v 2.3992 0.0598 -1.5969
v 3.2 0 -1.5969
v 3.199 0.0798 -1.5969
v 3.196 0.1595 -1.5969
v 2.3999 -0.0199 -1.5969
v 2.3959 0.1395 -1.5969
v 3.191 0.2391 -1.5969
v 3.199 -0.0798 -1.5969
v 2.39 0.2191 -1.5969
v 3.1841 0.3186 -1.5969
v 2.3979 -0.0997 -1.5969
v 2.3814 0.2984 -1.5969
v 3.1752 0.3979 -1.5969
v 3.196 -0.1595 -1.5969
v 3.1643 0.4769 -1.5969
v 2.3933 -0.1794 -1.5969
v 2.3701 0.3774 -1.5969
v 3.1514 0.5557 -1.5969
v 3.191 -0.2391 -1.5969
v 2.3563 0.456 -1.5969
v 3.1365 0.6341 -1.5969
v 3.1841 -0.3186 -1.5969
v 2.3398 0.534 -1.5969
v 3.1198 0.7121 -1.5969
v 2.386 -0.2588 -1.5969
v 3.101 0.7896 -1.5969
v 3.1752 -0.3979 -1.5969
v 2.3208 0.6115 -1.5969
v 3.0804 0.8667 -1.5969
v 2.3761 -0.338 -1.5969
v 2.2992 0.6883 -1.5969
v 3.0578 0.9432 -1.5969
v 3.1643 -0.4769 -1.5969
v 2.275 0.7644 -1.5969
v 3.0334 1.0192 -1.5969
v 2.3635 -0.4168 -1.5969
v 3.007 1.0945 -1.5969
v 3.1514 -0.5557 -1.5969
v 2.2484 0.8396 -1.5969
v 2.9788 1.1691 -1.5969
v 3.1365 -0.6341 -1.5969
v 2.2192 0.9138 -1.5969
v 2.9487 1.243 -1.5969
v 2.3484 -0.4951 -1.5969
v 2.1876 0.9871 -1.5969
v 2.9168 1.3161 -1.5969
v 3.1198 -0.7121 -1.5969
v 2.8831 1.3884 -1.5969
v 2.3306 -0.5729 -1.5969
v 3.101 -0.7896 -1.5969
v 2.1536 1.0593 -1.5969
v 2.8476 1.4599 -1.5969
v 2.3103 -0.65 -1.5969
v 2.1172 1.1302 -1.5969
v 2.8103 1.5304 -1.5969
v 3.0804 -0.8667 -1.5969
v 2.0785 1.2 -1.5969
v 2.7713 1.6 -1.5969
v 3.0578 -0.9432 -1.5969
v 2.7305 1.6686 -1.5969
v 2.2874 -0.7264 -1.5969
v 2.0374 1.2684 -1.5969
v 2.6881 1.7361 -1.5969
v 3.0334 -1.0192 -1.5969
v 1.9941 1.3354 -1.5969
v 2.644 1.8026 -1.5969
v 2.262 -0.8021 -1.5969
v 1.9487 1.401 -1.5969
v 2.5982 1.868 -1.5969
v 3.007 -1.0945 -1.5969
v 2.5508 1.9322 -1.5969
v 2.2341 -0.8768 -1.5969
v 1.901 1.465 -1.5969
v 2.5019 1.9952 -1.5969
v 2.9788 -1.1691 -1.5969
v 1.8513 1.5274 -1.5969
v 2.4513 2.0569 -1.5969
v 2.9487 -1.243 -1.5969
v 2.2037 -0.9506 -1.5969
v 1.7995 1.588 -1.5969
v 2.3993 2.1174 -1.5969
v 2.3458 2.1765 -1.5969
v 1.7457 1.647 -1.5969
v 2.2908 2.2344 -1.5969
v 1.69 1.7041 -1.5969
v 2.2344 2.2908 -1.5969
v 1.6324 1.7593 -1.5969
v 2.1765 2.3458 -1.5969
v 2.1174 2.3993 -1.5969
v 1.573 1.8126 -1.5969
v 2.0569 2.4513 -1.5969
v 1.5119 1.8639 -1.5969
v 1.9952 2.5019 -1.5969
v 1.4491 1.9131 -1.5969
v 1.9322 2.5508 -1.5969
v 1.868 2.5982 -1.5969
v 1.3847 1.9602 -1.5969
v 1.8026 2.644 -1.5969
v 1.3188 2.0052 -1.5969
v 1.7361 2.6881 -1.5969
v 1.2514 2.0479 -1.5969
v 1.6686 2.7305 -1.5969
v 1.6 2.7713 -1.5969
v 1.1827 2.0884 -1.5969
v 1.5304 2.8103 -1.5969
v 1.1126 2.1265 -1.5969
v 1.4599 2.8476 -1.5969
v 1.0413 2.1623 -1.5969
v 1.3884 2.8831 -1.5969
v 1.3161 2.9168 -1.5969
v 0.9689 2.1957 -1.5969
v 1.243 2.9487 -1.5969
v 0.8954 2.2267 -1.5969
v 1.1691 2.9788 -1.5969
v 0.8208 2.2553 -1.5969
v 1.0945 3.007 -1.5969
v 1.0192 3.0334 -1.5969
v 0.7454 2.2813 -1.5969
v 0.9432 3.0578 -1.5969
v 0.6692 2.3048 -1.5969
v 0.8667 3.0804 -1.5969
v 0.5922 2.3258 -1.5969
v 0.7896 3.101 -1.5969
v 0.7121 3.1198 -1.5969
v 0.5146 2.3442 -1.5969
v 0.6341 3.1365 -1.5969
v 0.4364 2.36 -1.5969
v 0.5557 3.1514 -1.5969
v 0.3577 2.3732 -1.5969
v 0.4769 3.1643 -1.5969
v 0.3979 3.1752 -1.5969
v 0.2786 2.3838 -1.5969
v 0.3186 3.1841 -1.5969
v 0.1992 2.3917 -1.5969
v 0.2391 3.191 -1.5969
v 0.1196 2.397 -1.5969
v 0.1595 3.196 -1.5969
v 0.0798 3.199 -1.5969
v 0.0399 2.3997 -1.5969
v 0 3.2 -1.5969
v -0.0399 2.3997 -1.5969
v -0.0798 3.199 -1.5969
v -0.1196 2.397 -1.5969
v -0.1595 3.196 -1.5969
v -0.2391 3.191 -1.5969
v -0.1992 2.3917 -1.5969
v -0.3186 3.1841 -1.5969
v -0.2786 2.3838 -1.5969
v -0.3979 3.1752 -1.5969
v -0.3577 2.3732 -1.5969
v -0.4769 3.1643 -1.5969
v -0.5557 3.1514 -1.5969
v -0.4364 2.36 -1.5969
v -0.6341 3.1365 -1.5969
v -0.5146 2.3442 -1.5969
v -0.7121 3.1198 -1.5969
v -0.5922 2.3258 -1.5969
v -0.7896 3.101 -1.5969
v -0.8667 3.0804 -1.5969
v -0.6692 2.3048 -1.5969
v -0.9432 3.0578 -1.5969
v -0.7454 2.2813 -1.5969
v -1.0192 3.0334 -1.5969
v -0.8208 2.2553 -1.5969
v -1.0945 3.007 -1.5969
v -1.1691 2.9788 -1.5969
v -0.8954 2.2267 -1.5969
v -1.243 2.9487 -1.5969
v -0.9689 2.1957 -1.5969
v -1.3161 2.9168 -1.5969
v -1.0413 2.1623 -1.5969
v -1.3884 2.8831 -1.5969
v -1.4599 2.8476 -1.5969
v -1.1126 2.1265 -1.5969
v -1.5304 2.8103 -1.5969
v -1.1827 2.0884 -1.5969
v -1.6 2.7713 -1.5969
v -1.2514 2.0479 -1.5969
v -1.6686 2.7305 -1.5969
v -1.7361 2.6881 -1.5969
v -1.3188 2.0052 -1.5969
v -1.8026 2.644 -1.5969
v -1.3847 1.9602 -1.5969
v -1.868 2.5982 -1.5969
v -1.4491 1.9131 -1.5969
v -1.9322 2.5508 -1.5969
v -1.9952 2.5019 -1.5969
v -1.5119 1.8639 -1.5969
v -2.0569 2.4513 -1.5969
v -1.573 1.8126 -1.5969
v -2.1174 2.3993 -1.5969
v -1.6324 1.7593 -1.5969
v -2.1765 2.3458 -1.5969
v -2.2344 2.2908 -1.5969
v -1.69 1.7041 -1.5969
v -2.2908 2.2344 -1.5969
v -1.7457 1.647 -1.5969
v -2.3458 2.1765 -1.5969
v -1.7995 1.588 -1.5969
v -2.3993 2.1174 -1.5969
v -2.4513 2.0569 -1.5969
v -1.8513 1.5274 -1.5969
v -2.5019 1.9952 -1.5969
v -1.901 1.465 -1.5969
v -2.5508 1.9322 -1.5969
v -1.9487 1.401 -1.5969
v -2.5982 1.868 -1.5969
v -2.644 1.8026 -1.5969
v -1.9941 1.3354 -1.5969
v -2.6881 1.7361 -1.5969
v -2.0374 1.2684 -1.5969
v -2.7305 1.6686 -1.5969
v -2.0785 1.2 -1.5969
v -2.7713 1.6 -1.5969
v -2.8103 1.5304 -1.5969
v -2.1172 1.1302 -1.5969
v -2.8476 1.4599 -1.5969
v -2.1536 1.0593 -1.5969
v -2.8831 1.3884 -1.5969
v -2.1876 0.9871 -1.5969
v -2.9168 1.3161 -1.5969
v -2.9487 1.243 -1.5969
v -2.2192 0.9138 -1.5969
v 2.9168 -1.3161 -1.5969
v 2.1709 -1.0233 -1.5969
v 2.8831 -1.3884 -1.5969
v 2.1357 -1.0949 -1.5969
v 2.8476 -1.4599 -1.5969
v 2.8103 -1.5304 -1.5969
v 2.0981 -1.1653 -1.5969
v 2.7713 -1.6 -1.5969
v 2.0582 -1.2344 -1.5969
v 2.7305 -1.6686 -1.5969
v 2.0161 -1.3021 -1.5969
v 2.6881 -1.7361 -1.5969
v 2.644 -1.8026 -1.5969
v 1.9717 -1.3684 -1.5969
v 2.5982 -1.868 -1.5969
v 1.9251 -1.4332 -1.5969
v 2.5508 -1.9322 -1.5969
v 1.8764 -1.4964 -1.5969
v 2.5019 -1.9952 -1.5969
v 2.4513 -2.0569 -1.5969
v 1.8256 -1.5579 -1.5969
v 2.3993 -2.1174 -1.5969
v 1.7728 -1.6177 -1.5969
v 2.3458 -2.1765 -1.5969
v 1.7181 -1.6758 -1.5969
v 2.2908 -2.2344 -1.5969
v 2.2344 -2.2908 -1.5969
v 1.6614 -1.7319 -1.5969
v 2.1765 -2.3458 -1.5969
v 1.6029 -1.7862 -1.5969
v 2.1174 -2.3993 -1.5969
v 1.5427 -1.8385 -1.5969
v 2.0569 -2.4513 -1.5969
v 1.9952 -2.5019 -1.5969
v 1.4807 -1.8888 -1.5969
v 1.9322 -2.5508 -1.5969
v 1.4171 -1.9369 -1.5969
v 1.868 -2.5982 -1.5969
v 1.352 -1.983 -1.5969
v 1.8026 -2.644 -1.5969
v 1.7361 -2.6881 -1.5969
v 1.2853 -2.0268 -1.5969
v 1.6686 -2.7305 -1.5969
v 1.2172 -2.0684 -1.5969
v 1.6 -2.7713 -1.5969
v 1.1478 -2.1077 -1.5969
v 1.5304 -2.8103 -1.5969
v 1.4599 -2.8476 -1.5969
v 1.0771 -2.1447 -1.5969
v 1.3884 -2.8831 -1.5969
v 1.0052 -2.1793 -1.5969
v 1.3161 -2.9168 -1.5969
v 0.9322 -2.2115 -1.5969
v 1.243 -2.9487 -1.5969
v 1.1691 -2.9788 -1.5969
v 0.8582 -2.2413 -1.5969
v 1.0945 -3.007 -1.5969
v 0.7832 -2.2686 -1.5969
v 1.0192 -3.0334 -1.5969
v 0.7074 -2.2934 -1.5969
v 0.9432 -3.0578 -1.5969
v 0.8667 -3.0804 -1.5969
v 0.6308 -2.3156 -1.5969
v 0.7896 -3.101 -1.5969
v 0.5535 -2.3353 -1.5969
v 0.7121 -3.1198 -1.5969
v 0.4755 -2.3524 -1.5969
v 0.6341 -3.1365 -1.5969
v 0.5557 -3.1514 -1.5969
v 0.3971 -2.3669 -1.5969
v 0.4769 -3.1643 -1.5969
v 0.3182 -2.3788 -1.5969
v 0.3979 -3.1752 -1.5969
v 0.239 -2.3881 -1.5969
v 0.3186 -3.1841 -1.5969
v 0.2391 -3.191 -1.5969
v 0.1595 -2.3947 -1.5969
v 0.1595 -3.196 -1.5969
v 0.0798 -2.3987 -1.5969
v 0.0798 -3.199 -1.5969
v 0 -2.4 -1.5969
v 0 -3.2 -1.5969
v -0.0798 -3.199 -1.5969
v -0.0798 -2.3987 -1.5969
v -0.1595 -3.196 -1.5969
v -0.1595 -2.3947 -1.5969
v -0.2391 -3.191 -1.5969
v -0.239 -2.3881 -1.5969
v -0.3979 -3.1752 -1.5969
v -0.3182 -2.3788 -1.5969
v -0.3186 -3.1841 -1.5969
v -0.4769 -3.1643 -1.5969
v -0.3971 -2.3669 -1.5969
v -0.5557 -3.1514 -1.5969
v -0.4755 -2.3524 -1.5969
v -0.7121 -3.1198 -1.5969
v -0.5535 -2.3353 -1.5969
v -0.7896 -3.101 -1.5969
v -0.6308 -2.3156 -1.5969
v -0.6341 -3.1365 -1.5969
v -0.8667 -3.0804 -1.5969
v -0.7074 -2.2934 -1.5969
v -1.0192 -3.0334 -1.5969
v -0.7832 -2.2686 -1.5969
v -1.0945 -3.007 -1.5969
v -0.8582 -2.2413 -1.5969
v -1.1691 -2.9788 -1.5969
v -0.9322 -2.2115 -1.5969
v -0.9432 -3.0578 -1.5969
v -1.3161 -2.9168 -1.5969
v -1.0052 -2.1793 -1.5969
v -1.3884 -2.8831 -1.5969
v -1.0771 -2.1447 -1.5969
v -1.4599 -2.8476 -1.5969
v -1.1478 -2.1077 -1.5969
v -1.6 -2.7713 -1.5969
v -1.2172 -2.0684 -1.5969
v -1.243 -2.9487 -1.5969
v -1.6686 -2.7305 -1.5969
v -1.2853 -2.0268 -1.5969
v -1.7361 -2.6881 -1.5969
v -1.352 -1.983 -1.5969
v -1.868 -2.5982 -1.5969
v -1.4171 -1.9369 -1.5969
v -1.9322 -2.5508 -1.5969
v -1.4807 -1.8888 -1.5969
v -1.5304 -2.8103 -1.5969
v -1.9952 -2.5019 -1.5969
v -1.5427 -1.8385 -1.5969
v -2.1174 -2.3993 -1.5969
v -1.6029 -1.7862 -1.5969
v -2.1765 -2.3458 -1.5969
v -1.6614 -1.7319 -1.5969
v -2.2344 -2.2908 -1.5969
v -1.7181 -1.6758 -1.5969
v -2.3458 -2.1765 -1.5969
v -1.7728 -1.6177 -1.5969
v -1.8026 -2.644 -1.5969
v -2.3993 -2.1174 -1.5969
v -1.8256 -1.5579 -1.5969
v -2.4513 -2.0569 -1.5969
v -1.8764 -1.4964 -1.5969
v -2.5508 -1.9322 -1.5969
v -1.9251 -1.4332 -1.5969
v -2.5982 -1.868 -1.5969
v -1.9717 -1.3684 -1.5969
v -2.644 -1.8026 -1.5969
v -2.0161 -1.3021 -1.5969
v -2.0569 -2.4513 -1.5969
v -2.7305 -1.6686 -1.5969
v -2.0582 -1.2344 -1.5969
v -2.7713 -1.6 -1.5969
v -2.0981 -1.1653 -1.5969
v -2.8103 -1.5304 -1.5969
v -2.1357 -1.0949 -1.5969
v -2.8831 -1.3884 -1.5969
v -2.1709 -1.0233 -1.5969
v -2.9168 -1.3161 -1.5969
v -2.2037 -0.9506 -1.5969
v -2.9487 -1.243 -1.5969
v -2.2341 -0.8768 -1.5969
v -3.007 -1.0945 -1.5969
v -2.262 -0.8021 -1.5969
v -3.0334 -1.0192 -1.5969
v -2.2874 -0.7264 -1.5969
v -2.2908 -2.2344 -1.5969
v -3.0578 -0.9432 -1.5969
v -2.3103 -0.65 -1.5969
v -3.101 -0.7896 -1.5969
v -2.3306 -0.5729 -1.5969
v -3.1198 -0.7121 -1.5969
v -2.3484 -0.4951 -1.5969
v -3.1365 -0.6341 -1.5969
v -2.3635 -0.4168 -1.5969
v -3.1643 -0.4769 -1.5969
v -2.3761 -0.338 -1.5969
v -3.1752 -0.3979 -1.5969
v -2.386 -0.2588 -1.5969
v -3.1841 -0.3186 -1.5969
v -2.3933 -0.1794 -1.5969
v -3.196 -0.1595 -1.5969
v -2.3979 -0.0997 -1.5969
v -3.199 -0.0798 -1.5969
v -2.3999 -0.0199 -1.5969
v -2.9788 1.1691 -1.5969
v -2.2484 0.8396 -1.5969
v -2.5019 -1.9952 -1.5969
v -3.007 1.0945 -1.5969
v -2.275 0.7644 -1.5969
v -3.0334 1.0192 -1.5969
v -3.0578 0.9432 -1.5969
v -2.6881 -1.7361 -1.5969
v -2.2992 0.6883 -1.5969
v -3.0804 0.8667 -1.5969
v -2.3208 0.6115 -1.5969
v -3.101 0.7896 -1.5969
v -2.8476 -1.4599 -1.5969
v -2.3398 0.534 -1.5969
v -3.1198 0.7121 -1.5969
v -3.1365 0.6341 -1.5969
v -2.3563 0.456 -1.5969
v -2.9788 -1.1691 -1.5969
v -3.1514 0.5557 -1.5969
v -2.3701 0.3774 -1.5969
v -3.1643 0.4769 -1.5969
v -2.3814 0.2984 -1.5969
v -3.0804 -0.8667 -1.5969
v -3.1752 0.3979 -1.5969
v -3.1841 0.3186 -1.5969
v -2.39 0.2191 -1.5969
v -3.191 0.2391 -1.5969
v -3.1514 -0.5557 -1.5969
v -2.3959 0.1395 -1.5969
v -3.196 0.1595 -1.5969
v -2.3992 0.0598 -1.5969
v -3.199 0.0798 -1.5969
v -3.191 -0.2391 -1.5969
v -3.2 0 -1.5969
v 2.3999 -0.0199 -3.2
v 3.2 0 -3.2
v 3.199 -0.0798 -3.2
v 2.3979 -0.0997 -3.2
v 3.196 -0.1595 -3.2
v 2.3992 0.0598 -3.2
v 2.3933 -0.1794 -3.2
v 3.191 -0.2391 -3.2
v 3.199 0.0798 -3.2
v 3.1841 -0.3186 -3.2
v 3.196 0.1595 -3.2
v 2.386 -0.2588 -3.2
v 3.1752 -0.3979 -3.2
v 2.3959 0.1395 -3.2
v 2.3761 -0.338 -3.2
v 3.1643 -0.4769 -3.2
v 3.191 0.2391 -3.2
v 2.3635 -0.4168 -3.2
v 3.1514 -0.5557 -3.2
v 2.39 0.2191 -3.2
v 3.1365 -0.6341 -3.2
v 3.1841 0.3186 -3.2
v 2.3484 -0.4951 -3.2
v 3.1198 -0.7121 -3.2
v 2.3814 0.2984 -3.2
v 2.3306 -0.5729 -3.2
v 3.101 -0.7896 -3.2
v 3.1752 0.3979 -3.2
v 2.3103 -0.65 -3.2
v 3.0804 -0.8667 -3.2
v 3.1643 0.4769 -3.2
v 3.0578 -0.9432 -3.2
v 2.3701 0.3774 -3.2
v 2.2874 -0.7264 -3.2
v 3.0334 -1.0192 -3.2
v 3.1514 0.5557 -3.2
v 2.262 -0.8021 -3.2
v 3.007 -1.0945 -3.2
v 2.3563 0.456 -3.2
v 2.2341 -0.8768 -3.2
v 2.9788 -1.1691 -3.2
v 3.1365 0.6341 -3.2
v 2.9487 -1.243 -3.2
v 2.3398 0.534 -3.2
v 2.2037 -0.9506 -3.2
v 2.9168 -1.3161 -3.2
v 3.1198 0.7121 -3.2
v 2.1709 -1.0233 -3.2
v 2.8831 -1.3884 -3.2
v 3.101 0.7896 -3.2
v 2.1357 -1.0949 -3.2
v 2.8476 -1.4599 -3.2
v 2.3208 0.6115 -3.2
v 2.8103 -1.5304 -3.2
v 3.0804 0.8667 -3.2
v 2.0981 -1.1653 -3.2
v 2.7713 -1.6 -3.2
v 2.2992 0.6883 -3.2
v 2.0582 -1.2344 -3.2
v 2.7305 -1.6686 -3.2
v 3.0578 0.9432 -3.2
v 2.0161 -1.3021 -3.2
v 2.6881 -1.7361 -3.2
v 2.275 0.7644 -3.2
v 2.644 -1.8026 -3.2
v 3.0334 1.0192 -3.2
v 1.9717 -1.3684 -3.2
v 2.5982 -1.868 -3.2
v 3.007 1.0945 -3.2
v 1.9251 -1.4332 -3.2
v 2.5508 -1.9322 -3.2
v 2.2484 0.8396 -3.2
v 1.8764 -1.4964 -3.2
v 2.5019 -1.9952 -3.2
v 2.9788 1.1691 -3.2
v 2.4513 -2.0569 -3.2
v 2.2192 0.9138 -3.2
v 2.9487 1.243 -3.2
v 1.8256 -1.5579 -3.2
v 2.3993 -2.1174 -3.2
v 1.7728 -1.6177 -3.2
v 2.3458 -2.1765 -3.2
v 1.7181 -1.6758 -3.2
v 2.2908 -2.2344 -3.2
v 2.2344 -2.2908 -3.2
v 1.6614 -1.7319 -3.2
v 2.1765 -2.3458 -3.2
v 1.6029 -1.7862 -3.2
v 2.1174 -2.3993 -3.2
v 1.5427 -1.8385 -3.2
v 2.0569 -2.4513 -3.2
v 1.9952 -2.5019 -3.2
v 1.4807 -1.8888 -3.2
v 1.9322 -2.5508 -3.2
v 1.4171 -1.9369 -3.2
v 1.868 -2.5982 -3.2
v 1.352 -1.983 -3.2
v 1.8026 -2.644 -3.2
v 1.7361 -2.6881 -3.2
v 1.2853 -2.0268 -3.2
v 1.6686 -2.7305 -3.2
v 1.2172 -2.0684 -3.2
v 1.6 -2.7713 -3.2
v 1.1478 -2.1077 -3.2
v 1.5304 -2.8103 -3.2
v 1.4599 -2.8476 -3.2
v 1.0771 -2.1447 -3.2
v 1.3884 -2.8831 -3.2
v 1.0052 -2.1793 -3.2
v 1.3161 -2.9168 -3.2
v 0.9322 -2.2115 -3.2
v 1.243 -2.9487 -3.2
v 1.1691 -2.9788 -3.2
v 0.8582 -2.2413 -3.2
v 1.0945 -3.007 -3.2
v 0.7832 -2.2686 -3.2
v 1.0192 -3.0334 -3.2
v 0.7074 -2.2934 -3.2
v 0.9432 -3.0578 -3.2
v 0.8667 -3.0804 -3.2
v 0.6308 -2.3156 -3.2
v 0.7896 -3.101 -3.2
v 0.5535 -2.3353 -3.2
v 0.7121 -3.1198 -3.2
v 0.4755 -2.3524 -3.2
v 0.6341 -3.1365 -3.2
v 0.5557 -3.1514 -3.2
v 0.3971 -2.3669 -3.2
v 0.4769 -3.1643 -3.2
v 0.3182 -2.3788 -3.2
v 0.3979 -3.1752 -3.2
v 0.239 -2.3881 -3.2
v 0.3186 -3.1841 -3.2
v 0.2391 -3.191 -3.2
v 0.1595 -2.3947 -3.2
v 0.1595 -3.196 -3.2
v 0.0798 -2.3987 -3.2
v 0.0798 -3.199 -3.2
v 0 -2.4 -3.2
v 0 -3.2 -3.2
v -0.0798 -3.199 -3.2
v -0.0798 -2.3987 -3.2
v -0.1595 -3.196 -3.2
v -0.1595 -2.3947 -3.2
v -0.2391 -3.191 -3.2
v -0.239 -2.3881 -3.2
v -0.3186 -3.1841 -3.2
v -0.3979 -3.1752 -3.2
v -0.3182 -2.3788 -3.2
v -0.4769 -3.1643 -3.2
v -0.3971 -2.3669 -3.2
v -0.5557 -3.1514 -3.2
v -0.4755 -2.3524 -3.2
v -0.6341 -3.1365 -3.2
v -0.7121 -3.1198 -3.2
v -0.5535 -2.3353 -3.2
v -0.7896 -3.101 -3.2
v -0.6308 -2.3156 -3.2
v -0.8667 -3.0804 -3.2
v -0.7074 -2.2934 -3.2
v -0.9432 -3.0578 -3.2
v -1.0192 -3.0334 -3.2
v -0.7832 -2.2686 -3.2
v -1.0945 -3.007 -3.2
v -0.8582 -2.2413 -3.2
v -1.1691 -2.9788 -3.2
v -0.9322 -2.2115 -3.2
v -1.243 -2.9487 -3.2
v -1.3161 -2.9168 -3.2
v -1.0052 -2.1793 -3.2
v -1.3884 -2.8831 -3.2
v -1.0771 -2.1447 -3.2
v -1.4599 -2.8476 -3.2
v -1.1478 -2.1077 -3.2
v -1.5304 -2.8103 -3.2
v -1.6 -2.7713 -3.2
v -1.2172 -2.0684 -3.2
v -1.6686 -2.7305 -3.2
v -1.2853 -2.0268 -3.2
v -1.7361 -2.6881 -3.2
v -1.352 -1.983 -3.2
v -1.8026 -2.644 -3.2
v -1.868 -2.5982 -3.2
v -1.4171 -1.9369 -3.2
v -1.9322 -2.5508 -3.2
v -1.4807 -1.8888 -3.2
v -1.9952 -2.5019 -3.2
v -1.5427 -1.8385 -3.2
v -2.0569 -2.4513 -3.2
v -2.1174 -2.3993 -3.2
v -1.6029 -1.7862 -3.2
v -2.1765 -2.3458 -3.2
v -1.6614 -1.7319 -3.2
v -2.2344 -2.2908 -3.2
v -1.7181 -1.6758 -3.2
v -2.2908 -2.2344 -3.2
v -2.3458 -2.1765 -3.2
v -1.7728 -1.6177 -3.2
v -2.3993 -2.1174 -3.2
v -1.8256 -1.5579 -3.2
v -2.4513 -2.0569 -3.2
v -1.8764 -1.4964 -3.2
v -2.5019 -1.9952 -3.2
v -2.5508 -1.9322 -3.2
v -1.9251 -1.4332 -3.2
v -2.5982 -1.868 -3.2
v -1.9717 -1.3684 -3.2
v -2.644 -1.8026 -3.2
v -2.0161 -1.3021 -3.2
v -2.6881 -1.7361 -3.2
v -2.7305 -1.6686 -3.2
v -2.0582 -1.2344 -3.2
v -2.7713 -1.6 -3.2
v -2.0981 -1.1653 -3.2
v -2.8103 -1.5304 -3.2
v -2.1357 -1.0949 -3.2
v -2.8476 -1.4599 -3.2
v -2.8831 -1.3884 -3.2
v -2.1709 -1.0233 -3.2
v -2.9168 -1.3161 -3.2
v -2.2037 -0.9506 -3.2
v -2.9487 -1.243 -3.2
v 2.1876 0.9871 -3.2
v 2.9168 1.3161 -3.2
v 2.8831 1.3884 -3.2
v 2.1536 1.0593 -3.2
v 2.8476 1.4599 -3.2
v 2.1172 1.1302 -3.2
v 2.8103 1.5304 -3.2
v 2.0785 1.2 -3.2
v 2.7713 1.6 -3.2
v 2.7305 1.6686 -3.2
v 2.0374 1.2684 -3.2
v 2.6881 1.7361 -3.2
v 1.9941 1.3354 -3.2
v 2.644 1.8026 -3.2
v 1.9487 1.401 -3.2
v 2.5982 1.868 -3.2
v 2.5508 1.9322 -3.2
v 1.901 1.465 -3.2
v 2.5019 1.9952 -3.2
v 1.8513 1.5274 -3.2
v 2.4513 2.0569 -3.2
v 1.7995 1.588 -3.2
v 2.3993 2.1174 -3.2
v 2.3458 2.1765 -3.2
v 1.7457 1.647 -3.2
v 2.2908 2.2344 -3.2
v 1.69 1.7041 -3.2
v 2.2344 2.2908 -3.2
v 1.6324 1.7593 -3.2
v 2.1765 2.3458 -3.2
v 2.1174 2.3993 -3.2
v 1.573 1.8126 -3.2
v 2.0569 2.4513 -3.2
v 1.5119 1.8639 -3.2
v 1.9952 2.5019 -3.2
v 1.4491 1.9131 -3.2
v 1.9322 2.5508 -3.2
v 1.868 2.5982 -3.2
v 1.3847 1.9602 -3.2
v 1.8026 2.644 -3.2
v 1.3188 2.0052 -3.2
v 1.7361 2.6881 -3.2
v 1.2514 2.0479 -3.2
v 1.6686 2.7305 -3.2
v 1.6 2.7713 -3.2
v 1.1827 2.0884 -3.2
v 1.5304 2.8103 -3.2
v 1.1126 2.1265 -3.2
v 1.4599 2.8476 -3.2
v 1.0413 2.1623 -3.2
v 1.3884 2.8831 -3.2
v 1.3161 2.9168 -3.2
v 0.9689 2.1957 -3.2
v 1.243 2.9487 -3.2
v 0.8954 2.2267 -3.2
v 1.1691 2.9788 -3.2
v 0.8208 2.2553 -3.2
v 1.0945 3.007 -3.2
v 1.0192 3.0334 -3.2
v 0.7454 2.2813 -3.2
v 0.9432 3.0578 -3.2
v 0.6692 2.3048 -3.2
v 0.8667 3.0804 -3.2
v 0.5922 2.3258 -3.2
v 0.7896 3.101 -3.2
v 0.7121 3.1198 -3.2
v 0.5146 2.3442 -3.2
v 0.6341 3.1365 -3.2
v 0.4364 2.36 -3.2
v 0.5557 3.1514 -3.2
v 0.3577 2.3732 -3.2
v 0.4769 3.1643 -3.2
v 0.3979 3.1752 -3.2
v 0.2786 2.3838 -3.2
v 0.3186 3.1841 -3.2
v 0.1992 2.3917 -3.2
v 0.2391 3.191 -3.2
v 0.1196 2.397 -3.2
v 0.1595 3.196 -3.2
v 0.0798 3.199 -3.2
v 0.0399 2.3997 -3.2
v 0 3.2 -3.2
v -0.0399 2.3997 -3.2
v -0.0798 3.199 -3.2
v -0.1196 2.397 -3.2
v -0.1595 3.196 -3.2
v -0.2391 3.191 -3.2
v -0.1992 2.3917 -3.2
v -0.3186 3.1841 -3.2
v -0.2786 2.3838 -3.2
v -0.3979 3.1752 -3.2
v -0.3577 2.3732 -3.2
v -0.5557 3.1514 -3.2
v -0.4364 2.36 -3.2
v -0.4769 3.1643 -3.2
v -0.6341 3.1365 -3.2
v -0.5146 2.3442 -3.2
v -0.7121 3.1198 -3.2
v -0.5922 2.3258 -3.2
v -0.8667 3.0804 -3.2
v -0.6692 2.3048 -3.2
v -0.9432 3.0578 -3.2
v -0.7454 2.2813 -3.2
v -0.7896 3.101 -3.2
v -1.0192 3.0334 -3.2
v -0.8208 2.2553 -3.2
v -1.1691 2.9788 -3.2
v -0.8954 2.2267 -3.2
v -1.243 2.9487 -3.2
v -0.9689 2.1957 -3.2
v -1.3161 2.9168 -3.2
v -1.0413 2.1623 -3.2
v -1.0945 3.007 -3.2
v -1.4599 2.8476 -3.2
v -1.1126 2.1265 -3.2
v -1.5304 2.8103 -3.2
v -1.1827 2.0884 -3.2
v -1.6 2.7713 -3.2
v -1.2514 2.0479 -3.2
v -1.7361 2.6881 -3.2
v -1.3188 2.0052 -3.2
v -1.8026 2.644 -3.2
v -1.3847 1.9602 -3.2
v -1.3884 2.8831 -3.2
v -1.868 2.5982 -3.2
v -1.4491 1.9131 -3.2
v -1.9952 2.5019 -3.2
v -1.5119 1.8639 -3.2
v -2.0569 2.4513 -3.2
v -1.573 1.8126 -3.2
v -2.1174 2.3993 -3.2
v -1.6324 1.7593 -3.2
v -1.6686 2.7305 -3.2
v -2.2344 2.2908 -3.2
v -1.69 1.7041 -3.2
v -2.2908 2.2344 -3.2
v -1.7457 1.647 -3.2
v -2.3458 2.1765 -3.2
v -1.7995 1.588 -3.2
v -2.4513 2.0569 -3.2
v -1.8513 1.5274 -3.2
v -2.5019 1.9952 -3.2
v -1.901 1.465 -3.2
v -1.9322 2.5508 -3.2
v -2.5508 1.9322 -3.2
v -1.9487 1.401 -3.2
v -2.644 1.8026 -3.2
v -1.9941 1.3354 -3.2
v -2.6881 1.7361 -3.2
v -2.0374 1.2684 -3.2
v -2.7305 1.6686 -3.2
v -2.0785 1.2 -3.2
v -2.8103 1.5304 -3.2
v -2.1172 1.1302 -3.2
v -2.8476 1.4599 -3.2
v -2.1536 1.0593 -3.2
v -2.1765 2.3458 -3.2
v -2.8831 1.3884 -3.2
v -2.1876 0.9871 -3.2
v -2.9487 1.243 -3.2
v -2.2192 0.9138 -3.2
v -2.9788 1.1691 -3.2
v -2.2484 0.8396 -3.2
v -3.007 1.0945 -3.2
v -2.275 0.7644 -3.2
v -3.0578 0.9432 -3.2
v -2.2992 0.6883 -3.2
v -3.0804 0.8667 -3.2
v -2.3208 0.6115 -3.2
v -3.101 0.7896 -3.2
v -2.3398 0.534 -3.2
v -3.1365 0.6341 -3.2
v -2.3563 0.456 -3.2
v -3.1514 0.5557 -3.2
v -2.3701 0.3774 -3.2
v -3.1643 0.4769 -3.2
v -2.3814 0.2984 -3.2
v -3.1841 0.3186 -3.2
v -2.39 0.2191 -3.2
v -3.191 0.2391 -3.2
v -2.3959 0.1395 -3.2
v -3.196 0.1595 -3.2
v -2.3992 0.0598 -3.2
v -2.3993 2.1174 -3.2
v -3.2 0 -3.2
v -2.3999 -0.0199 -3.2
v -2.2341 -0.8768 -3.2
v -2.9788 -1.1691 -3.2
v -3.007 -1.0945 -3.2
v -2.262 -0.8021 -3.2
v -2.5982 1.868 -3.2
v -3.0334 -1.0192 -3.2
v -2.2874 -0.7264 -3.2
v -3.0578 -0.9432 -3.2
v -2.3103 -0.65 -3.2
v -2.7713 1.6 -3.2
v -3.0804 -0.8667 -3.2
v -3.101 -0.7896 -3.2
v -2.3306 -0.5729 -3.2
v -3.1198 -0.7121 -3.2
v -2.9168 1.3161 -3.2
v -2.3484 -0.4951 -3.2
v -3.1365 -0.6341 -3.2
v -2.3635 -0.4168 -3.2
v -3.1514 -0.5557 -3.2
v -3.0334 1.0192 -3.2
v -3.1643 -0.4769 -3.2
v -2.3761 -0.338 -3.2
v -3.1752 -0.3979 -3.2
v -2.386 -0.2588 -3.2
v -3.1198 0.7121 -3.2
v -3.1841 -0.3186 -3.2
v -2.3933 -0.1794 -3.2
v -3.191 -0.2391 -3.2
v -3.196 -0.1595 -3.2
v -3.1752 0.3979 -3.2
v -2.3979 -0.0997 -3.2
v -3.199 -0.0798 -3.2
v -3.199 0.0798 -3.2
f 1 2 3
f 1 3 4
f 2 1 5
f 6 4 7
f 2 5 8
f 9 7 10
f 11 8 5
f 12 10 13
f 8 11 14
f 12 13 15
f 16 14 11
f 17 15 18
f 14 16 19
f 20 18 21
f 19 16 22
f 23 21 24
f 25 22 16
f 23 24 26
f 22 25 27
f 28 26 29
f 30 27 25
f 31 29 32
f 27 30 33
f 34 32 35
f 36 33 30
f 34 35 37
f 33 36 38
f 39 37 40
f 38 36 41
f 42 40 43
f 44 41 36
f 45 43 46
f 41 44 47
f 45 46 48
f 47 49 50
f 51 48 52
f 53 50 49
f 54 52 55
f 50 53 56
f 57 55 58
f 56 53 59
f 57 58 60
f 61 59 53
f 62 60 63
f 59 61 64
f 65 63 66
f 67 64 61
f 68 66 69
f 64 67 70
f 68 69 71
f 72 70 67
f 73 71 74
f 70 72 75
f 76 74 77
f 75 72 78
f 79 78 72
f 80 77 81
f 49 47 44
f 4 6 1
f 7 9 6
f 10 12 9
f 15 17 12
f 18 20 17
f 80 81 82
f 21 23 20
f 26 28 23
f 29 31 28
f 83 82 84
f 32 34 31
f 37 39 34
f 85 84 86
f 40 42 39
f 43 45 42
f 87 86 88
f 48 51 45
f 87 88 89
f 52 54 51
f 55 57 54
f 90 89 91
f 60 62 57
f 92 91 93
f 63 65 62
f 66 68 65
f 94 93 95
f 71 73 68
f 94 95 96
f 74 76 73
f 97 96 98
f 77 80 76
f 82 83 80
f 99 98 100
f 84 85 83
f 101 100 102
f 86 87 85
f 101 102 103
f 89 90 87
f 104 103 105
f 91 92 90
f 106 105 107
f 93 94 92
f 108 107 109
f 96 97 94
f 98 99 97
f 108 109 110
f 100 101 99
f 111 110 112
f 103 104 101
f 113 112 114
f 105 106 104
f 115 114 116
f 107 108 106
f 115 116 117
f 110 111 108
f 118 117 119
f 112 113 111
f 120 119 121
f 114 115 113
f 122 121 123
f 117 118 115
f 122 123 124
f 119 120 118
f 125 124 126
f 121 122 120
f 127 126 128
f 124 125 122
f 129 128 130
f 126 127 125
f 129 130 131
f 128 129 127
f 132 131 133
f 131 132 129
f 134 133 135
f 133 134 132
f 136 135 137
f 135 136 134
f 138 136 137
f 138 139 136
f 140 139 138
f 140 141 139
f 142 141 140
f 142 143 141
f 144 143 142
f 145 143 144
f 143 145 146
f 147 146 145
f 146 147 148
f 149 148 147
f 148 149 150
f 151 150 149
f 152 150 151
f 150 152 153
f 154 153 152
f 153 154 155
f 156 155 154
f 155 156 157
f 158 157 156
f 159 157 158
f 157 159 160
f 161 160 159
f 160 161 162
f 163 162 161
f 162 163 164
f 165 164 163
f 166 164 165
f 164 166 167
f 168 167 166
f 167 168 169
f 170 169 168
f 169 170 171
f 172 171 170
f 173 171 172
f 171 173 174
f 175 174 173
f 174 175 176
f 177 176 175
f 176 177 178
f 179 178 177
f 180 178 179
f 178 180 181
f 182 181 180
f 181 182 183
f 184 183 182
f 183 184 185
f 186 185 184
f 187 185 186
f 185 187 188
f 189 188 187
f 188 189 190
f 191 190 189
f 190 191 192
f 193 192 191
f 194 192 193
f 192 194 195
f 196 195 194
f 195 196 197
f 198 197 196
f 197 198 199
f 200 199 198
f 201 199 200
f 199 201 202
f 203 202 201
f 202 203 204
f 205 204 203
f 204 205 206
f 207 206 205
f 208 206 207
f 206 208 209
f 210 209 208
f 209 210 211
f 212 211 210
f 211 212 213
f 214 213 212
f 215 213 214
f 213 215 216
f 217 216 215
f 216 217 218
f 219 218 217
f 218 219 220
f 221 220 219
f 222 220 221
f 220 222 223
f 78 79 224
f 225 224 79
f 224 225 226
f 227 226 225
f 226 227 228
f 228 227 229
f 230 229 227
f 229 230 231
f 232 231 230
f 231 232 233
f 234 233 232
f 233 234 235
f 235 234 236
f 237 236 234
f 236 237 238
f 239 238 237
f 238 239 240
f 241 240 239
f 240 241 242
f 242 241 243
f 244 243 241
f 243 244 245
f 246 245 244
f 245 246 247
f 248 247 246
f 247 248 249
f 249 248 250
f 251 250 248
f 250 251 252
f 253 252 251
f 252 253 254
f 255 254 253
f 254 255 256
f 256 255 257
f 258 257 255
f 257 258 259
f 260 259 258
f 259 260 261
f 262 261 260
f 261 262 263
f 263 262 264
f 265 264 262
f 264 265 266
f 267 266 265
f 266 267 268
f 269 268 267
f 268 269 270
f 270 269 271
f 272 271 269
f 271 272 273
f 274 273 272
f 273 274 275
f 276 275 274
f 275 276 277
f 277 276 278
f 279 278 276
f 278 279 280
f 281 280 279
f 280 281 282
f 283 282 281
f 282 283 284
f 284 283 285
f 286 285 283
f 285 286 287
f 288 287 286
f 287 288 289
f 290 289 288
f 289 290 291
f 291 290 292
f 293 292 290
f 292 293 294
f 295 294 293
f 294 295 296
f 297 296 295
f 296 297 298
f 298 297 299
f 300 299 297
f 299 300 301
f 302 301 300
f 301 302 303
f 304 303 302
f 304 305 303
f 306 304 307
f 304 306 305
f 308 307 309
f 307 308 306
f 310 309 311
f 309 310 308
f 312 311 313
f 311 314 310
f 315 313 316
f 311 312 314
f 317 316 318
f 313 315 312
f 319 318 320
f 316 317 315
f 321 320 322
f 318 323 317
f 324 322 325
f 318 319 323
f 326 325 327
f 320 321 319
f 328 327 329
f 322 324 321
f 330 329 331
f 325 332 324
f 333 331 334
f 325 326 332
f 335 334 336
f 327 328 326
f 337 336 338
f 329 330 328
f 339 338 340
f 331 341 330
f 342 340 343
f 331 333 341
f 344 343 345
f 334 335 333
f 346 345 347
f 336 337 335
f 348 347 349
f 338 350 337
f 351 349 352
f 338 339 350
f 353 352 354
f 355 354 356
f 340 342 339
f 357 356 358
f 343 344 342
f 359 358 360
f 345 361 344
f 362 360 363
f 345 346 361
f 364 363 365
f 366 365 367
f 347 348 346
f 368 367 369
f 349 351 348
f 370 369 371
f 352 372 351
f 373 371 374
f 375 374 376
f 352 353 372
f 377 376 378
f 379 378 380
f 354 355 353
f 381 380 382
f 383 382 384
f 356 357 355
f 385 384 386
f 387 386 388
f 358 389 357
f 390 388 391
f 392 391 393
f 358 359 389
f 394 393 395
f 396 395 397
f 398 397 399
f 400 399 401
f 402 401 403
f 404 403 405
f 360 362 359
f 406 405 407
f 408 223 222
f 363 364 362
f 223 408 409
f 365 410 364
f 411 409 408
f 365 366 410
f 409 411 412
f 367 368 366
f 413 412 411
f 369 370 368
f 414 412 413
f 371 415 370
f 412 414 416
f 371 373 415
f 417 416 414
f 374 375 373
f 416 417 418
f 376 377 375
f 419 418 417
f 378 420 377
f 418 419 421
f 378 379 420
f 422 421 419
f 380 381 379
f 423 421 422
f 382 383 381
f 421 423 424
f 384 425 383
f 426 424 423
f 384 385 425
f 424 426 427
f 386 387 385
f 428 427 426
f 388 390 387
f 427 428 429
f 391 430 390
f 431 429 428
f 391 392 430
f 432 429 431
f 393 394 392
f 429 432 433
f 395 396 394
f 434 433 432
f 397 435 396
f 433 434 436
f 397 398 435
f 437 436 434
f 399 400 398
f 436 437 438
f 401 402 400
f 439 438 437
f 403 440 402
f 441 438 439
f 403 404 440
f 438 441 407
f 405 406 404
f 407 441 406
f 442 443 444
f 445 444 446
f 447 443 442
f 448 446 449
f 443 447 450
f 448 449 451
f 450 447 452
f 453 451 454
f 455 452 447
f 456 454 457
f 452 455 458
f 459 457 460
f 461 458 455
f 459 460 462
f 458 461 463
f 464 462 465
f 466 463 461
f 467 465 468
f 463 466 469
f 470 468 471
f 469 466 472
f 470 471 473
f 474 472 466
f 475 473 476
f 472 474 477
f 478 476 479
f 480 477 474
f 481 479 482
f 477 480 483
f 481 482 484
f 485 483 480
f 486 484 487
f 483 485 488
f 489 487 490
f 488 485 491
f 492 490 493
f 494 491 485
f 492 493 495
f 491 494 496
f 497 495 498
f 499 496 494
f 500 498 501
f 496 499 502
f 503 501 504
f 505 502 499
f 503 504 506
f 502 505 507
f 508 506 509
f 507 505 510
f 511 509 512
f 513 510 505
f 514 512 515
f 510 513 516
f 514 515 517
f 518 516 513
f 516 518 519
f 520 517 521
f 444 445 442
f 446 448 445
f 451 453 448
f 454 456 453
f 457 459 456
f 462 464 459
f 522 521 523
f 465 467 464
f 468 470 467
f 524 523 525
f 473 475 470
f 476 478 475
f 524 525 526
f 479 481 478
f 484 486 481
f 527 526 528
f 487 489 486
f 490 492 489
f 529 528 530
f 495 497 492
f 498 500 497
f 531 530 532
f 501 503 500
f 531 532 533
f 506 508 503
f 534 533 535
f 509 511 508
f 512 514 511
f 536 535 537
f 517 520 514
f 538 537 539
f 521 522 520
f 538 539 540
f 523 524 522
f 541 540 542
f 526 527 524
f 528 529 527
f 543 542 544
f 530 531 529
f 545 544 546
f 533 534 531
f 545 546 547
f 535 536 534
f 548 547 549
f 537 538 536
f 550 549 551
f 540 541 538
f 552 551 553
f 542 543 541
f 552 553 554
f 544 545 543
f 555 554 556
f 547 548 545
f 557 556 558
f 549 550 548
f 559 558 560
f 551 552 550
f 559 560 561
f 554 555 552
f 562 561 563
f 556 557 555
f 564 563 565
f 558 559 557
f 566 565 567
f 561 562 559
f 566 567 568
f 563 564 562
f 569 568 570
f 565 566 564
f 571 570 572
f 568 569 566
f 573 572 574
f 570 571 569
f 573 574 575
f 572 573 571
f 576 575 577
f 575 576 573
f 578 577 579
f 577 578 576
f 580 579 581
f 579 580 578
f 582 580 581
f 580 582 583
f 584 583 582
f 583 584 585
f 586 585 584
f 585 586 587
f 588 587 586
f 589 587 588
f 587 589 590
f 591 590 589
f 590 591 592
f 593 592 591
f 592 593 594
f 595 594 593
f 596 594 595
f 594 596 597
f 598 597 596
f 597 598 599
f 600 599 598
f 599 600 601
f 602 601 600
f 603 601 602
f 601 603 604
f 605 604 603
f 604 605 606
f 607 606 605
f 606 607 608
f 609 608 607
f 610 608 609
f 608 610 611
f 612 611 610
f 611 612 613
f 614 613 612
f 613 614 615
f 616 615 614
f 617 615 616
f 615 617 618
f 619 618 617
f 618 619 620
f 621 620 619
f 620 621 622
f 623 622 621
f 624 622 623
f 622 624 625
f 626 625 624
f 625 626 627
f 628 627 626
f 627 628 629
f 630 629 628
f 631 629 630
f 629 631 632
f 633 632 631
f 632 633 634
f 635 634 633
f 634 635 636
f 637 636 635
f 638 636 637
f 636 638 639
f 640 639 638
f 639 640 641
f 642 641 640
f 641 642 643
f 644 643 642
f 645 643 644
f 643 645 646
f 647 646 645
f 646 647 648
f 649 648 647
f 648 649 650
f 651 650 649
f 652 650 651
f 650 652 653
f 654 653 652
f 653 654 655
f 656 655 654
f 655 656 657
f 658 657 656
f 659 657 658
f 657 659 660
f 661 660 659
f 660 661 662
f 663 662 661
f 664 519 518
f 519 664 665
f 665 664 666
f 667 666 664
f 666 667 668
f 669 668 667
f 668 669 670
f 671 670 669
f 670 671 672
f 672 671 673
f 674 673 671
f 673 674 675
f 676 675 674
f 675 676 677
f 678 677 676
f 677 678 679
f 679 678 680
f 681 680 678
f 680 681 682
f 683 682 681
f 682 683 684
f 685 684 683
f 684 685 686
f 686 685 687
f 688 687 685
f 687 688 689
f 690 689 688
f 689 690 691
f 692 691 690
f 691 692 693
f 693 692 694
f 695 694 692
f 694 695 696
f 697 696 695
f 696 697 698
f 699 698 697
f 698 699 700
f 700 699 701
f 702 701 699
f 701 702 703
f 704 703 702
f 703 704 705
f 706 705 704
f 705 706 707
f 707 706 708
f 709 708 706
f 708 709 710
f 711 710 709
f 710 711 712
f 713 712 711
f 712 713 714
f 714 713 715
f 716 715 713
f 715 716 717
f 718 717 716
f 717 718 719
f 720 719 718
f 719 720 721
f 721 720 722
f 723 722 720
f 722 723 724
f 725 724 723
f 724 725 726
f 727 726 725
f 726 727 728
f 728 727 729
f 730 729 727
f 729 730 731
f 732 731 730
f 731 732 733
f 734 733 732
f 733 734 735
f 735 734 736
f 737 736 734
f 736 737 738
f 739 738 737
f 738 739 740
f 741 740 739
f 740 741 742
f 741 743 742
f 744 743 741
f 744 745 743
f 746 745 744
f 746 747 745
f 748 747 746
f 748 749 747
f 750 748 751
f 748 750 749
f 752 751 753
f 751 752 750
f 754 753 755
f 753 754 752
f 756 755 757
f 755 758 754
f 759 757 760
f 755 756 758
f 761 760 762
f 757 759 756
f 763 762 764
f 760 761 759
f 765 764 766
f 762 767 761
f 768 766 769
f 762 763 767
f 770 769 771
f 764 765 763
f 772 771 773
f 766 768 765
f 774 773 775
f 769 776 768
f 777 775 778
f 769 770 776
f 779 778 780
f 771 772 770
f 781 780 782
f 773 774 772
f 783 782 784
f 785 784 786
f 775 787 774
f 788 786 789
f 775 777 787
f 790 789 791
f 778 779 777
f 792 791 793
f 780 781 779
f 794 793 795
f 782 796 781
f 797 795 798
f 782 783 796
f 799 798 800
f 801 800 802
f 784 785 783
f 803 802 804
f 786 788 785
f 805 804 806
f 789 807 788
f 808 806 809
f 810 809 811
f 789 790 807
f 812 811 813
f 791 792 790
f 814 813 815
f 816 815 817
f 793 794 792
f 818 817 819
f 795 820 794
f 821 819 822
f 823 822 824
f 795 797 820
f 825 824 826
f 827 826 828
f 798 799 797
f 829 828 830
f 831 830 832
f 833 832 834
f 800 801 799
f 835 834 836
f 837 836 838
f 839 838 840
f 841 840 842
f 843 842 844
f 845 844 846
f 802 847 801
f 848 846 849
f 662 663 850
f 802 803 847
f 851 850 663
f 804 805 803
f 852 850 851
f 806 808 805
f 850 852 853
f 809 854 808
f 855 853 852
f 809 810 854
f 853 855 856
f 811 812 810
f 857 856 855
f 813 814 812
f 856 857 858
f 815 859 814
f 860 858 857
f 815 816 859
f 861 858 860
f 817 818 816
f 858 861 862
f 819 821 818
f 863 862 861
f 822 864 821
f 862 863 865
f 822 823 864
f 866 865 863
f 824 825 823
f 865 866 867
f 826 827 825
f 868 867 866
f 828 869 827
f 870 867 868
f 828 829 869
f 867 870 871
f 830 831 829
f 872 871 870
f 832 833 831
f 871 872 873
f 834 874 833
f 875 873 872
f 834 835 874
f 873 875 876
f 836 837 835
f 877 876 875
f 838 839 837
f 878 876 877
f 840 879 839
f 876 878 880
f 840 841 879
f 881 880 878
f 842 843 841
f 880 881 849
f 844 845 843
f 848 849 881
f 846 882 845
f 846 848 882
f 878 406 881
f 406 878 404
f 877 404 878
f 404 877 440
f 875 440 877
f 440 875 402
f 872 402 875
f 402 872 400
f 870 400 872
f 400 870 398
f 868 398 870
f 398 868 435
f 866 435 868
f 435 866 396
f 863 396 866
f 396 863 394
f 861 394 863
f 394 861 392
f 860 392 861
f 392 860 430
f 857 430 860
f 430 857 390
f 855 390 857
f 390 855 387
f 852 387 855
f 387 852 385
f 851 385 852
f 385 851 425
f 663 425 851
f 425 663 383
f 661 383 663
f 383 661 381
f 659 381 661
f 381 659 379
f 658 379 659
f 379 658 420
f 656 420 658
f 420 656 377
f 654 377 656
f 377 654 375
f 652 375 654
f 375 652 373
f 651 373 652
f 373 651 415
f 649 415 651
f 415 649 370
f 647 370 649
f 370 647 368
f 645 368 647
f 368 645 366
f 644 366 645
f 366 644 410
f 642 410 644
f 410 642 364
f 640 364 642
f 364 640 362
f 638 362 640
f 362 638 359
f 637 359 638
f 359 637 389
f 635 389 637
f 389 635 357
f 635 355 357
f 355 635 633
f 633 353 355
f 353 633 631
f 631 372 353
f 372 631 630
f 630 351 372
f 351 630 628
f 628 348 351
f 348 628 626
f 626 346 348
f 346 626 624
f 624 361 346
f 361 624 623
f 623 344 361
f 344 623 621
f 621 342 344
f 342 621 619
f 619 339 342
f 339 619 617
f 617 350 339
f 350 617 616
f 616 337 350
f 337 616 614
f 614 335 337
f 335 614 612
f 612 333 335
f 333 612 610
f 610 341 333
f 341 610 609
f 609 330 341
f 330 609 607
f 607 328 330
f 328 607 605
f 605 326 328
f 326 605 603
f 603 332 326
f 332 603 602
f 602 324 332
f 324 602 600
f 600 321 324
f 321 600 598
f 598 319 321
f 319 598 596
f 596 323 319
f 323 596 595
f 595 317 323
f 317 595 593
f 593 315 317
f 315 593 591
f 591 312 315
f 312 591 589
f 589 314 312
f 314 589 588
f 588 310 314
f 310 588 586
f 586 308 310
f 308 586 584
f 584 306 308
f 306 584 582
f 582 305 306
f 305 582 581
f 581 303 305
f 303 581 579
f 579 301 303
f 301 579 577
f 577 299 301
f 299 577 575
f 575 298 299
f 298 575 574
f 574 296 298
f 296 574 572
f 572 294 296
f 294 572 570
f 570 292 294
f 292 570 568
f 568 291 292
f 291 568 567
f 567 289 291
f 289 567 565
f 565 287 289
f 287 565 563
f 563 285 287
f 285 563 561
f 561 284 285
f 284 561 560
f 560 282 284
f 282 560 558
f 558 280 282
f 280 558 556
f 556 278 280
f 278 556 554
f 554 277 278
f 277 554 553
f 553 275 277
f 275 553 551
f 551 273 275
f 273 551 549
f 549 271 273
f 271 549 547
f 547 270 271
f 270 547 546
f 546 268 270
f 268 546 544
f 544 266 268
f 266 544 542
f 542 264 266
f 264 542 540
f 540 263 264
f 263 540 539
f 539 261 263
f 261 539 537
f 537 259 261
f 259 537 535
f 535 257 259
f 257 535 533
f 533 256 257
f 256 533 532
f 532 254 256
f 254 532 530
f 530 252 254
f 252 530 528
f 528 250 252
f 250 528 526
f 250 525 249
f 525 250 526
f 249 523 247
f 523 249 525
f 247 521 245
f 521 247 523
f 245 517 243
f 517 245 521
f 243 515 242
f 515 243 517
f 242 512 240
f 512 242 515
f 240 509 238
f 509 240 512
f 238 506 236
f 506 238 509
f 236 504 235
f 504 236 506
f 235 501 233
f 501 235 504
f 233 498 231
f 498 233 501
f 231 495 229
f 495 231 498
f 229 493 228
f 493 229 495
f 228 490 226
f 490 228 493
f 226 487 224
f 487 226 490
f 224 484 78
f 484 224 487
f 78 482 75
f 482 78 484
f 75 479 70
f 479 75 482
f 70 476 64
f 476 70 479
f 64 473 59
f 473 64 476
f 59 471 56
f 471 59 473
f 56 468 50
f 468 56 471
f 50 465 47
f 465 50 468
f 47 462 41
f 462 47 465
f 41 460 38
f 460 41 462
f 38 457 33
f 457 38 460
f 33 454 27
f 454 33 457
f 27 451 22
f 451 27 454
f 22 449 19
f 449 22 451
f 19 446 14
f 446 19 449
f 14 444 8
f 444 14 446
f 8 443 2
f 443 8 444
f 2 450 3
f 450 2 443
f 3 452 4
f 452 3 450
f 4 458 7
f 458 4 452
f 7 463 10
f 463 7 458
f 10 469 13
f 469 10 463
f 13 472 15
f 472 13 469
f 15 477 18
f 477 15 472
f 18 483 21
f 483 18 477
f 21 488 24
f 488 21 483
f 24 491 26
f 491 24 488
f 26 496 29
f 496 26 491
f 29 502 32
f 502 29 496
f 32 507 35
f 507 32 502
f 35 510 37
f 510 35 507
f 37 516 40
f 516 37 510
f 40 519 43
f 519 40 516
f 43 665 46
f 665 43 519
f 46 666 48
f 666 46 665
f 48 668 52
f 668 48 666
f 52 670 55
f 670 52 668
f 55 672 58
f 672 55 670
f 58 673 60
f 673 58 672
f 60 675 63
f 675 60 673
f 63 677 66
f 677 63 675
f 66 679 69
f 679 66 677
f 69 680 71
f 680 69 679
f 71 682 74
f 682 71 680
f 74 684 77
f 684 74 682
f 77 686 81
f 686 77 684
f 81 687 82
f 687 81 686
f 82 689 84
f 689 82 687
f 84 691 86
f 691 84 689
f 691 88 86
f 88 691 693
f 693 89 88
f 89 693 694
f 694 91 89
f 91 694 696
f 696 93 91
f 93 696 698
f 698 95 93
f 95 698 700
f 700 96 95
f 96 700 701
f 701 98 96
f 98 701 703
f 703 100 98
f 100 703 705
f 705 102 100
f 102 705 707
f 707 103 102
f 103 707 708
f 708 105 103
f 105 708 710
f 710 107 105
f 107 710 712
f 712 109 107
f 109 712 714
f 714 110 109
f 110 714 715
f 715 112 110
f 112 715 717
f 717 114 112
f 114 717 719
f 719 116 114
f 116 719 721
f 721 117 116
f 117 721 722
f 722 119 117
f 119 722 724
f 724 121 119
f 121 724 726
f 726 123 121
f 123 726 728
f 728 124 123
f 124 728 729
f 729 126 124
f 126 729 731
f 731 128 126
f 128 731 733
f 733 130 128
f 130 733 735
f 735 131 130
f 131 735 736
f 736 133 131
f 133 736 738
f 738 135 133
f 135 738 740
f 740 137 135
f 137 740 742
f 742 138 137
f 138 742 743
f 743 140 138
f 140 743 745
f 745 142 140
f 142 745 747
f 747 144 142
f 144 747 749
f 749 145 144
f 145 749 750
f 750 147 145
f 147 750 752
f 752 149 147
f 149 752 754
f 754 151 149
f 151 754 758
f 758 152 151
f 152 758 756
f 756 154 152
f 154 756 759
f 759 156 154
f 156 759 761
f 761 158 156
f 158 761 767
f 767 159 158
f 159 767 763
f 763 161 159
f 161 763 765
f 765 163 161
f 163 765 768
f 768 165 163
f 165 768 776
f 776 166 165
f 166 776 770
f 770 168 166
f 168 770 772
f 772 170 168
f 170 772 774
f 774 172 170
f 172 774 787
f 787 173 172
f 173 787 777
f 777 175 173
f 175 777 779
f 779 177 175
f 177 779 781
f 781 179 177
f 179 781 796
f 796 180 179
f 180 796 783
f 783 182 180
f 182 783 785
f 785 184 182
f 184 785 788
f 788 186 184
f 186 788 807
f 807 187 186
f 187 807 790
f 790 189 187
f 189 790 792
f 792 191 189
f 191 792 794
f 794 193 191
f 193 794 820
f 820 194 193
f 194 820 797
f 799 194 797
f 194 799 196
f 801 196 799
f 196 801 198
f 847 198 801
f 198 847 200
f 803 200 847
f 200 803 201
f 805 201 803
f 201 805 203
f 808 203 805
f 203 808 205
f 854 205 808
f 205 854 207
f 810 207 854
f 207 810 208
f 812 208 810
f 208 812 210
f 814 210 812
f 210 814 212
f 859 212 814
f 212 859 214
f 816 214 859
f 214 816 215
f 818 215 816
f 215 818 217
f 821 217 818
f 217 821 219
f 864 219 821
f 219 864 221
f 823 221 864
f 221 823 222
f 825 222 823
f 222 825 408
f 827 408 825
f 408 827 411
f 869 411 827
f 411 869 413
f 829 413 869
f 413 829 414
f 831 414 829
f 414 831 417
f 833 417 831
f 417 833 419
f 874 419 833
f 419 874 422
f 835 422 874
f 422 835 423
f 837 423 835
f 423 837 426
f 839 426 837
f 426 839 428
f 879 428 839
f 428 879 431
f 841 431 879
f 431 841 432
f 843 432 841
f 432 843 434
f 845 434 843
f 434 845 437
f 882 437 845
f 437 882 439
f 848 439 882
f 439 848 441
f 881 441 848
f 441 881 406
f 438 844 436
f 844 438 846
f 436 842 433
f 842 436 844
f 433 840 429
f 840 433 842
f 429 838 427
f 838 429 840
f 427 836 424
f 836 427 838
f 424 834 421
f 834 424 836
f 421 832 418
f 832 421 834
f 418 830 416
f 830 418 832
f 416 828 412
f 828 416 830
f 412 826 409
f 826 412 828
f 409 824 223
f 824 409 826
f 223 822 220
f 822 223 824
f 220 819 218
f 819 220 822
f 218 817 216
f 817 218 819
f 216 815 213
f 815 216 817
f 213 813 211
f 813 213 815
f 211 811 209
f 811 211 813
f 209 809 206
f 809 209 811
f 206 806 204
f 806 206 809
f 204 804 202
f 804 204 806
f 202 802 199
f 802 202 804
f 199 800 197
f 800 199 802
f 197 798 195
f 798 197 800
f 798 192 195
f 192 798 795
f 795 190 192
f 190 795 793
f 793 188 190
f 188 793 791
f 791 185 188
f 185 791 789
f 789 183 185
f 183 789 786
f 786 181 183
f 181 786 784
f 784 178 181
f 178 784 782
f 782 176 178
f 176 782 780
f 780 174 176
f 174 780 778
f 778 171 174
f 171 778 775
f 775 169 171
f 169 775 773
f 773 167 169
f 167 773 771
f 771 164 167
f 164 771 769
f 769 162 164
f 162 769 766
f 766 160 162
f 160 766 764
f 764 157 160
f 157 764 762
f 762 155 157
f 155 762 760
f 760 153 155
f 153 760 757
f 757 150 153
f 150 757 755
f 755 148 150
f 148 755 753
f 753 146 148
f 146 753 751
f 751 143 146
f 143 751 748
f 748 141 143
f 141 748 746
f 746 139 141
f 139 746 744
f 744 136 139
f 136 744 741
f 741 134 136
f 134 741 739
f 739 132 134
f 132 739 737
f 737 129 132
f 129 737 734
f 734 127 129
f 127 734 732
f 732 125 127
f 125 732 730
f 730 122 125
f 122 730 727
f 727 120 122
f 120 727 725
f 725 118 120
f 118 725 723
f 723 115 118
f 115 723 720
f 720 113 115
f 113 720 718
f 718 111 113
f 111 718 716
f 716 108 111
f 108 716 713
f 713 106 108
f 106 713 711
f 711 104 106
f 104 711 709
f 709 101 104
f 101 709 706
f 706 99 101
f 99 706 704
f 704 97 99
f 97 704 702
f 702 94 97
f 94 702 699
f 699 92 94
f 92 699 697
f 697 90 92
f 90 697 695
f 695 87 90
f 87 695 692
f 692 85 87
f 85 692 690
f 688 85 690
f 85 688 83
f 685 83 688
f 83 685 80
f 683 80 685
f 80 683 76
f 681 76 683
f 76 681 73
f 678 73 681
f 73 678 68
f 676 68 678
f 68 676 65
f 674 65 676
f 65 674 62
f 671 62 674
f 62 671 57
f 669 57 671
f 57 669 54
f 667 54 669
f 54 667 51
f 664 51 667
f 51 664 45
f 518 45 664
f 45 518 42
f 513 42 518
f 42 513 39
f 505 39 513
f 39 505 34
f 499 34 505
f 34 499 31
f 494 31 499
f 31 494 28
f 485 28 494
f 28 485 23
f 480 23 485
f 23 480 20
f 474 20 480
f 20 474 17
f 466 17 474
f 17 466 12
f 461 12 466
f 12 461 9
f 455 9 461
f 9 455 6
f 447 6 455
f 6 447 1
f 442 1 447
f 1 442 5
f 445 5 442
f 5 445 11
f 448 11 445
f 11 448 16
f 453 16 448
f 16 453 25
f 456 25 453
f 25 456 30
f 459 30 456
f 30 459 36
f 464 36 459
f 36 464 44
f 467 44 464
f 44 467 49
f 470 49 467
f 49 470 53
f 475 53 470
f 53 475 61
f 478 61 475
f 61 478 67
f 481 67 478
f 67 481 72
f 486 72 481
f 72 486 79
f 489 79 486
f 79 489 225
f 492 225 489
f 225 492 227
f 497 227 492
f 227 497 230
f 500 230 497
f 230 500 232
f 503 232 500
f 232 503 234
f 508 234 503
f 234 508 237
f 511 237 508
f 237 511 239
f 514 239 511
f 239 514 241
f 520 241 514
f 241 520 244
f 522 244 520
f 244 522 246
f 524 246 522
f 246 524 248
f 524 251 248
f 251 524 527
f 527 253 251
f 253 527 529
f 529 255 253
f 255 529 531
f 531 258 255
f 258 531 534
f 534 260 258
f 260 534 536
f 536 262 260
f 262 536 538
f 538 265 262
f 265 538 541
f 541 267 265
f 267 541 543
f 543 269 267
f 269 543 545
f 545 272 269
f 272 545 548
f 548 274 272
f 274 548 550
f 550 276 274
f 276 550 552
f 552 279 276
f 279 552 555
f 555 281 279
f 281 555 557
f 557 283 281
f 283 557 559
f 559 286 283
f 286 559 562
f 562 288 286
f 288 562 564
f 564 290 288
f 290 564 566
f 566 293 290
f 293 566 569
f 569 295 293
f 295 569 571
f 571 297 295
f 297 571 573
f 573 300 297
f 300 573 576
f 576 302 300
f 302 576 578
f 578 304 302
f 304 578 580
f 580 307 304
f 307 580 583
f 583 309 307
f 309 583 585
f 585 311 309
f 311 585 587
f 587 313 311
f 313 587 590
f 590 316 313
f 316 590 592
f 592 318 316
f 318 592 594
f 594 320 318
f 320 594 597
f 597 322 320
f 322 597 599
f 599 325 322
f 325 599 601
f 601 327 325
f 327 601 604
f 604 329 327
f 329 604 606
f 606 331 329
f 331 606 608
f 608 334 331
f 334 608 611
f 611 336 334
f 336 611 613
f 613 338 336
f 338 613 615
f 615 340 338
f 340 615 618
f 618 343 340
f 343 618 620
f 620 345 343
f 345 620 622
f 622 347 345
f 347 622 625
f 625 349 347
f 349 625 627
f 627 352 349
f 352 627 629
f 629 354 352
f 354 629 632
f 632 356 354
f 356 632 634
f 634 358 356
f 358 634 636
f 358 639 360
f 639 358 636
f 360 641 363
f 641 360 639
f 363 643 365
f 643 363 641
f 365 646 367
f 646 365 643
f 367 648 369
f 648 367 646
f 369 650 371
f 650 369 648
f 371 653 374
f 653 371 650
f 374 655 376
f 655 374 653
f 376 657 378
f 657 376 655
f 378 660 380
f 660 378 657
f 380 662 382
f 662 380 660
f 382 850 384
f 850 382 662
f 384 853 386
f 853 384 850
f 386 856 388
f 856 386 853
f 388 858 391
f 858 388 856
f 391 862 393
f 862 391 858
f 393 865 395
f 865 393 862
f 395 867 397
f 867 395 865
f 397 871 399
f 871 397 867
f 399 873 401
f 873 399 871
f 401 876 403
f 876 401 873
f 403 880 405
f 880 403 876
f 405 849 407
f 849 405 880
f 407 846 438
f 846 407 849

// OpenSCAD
use <../lib.scad>
use <3068bp50.scad>
$fa=1; $fs=0.2;
function ldraw_lib__3068p50(realsolid=false) = [
// 0 ~Moved to 3068bp50
// 0 Name: 3068p50.dat
// 0 Author: [PTadmin]
// 0 !LDRAW_ORG Part UPDATE 2002-04
// 0 !LICENSE Licensed under CC BY 4.0 : see CAreadme.txt
// 
// 0 BFC CERTIFY CCW
  [0,"BFC","CERTIFY"],
  [0,"BFC","CCW"],
// 
// 0 !HISTORY 1998-09-15 [PTadmin] Official Update 1998-08
// 0 !HISTORY 2002-08-18 [PTadmin] Official Update 2002-04
// 0 !HISTORY 2007-06-13 [PTadmin] Header formatted for Contributor Agreement
// 0 !HISTORY 2008-07-01 [PTadmin] Official Update 2008-01
// 
// 
// 1 16 0 0 0 1 0 0 0 1 0 0 0 1 3068bp50.dat
  [1,16,0,0,0,1,0,0,0,1,0,0,0,1, ldraw_lib__3068bp50(realsolid)],
];
module ldraw_lib__3068p50(step=0, col=false, unit=2/5, alt=false, line=0.2, solid=!$preview)
    makepoly(ldraw_lib__3068p50(solid), step=step, col=col, unit=unit, alt=alt, line=line, solid=solid);
ldraw_lib__3068p50(line=0.2);
